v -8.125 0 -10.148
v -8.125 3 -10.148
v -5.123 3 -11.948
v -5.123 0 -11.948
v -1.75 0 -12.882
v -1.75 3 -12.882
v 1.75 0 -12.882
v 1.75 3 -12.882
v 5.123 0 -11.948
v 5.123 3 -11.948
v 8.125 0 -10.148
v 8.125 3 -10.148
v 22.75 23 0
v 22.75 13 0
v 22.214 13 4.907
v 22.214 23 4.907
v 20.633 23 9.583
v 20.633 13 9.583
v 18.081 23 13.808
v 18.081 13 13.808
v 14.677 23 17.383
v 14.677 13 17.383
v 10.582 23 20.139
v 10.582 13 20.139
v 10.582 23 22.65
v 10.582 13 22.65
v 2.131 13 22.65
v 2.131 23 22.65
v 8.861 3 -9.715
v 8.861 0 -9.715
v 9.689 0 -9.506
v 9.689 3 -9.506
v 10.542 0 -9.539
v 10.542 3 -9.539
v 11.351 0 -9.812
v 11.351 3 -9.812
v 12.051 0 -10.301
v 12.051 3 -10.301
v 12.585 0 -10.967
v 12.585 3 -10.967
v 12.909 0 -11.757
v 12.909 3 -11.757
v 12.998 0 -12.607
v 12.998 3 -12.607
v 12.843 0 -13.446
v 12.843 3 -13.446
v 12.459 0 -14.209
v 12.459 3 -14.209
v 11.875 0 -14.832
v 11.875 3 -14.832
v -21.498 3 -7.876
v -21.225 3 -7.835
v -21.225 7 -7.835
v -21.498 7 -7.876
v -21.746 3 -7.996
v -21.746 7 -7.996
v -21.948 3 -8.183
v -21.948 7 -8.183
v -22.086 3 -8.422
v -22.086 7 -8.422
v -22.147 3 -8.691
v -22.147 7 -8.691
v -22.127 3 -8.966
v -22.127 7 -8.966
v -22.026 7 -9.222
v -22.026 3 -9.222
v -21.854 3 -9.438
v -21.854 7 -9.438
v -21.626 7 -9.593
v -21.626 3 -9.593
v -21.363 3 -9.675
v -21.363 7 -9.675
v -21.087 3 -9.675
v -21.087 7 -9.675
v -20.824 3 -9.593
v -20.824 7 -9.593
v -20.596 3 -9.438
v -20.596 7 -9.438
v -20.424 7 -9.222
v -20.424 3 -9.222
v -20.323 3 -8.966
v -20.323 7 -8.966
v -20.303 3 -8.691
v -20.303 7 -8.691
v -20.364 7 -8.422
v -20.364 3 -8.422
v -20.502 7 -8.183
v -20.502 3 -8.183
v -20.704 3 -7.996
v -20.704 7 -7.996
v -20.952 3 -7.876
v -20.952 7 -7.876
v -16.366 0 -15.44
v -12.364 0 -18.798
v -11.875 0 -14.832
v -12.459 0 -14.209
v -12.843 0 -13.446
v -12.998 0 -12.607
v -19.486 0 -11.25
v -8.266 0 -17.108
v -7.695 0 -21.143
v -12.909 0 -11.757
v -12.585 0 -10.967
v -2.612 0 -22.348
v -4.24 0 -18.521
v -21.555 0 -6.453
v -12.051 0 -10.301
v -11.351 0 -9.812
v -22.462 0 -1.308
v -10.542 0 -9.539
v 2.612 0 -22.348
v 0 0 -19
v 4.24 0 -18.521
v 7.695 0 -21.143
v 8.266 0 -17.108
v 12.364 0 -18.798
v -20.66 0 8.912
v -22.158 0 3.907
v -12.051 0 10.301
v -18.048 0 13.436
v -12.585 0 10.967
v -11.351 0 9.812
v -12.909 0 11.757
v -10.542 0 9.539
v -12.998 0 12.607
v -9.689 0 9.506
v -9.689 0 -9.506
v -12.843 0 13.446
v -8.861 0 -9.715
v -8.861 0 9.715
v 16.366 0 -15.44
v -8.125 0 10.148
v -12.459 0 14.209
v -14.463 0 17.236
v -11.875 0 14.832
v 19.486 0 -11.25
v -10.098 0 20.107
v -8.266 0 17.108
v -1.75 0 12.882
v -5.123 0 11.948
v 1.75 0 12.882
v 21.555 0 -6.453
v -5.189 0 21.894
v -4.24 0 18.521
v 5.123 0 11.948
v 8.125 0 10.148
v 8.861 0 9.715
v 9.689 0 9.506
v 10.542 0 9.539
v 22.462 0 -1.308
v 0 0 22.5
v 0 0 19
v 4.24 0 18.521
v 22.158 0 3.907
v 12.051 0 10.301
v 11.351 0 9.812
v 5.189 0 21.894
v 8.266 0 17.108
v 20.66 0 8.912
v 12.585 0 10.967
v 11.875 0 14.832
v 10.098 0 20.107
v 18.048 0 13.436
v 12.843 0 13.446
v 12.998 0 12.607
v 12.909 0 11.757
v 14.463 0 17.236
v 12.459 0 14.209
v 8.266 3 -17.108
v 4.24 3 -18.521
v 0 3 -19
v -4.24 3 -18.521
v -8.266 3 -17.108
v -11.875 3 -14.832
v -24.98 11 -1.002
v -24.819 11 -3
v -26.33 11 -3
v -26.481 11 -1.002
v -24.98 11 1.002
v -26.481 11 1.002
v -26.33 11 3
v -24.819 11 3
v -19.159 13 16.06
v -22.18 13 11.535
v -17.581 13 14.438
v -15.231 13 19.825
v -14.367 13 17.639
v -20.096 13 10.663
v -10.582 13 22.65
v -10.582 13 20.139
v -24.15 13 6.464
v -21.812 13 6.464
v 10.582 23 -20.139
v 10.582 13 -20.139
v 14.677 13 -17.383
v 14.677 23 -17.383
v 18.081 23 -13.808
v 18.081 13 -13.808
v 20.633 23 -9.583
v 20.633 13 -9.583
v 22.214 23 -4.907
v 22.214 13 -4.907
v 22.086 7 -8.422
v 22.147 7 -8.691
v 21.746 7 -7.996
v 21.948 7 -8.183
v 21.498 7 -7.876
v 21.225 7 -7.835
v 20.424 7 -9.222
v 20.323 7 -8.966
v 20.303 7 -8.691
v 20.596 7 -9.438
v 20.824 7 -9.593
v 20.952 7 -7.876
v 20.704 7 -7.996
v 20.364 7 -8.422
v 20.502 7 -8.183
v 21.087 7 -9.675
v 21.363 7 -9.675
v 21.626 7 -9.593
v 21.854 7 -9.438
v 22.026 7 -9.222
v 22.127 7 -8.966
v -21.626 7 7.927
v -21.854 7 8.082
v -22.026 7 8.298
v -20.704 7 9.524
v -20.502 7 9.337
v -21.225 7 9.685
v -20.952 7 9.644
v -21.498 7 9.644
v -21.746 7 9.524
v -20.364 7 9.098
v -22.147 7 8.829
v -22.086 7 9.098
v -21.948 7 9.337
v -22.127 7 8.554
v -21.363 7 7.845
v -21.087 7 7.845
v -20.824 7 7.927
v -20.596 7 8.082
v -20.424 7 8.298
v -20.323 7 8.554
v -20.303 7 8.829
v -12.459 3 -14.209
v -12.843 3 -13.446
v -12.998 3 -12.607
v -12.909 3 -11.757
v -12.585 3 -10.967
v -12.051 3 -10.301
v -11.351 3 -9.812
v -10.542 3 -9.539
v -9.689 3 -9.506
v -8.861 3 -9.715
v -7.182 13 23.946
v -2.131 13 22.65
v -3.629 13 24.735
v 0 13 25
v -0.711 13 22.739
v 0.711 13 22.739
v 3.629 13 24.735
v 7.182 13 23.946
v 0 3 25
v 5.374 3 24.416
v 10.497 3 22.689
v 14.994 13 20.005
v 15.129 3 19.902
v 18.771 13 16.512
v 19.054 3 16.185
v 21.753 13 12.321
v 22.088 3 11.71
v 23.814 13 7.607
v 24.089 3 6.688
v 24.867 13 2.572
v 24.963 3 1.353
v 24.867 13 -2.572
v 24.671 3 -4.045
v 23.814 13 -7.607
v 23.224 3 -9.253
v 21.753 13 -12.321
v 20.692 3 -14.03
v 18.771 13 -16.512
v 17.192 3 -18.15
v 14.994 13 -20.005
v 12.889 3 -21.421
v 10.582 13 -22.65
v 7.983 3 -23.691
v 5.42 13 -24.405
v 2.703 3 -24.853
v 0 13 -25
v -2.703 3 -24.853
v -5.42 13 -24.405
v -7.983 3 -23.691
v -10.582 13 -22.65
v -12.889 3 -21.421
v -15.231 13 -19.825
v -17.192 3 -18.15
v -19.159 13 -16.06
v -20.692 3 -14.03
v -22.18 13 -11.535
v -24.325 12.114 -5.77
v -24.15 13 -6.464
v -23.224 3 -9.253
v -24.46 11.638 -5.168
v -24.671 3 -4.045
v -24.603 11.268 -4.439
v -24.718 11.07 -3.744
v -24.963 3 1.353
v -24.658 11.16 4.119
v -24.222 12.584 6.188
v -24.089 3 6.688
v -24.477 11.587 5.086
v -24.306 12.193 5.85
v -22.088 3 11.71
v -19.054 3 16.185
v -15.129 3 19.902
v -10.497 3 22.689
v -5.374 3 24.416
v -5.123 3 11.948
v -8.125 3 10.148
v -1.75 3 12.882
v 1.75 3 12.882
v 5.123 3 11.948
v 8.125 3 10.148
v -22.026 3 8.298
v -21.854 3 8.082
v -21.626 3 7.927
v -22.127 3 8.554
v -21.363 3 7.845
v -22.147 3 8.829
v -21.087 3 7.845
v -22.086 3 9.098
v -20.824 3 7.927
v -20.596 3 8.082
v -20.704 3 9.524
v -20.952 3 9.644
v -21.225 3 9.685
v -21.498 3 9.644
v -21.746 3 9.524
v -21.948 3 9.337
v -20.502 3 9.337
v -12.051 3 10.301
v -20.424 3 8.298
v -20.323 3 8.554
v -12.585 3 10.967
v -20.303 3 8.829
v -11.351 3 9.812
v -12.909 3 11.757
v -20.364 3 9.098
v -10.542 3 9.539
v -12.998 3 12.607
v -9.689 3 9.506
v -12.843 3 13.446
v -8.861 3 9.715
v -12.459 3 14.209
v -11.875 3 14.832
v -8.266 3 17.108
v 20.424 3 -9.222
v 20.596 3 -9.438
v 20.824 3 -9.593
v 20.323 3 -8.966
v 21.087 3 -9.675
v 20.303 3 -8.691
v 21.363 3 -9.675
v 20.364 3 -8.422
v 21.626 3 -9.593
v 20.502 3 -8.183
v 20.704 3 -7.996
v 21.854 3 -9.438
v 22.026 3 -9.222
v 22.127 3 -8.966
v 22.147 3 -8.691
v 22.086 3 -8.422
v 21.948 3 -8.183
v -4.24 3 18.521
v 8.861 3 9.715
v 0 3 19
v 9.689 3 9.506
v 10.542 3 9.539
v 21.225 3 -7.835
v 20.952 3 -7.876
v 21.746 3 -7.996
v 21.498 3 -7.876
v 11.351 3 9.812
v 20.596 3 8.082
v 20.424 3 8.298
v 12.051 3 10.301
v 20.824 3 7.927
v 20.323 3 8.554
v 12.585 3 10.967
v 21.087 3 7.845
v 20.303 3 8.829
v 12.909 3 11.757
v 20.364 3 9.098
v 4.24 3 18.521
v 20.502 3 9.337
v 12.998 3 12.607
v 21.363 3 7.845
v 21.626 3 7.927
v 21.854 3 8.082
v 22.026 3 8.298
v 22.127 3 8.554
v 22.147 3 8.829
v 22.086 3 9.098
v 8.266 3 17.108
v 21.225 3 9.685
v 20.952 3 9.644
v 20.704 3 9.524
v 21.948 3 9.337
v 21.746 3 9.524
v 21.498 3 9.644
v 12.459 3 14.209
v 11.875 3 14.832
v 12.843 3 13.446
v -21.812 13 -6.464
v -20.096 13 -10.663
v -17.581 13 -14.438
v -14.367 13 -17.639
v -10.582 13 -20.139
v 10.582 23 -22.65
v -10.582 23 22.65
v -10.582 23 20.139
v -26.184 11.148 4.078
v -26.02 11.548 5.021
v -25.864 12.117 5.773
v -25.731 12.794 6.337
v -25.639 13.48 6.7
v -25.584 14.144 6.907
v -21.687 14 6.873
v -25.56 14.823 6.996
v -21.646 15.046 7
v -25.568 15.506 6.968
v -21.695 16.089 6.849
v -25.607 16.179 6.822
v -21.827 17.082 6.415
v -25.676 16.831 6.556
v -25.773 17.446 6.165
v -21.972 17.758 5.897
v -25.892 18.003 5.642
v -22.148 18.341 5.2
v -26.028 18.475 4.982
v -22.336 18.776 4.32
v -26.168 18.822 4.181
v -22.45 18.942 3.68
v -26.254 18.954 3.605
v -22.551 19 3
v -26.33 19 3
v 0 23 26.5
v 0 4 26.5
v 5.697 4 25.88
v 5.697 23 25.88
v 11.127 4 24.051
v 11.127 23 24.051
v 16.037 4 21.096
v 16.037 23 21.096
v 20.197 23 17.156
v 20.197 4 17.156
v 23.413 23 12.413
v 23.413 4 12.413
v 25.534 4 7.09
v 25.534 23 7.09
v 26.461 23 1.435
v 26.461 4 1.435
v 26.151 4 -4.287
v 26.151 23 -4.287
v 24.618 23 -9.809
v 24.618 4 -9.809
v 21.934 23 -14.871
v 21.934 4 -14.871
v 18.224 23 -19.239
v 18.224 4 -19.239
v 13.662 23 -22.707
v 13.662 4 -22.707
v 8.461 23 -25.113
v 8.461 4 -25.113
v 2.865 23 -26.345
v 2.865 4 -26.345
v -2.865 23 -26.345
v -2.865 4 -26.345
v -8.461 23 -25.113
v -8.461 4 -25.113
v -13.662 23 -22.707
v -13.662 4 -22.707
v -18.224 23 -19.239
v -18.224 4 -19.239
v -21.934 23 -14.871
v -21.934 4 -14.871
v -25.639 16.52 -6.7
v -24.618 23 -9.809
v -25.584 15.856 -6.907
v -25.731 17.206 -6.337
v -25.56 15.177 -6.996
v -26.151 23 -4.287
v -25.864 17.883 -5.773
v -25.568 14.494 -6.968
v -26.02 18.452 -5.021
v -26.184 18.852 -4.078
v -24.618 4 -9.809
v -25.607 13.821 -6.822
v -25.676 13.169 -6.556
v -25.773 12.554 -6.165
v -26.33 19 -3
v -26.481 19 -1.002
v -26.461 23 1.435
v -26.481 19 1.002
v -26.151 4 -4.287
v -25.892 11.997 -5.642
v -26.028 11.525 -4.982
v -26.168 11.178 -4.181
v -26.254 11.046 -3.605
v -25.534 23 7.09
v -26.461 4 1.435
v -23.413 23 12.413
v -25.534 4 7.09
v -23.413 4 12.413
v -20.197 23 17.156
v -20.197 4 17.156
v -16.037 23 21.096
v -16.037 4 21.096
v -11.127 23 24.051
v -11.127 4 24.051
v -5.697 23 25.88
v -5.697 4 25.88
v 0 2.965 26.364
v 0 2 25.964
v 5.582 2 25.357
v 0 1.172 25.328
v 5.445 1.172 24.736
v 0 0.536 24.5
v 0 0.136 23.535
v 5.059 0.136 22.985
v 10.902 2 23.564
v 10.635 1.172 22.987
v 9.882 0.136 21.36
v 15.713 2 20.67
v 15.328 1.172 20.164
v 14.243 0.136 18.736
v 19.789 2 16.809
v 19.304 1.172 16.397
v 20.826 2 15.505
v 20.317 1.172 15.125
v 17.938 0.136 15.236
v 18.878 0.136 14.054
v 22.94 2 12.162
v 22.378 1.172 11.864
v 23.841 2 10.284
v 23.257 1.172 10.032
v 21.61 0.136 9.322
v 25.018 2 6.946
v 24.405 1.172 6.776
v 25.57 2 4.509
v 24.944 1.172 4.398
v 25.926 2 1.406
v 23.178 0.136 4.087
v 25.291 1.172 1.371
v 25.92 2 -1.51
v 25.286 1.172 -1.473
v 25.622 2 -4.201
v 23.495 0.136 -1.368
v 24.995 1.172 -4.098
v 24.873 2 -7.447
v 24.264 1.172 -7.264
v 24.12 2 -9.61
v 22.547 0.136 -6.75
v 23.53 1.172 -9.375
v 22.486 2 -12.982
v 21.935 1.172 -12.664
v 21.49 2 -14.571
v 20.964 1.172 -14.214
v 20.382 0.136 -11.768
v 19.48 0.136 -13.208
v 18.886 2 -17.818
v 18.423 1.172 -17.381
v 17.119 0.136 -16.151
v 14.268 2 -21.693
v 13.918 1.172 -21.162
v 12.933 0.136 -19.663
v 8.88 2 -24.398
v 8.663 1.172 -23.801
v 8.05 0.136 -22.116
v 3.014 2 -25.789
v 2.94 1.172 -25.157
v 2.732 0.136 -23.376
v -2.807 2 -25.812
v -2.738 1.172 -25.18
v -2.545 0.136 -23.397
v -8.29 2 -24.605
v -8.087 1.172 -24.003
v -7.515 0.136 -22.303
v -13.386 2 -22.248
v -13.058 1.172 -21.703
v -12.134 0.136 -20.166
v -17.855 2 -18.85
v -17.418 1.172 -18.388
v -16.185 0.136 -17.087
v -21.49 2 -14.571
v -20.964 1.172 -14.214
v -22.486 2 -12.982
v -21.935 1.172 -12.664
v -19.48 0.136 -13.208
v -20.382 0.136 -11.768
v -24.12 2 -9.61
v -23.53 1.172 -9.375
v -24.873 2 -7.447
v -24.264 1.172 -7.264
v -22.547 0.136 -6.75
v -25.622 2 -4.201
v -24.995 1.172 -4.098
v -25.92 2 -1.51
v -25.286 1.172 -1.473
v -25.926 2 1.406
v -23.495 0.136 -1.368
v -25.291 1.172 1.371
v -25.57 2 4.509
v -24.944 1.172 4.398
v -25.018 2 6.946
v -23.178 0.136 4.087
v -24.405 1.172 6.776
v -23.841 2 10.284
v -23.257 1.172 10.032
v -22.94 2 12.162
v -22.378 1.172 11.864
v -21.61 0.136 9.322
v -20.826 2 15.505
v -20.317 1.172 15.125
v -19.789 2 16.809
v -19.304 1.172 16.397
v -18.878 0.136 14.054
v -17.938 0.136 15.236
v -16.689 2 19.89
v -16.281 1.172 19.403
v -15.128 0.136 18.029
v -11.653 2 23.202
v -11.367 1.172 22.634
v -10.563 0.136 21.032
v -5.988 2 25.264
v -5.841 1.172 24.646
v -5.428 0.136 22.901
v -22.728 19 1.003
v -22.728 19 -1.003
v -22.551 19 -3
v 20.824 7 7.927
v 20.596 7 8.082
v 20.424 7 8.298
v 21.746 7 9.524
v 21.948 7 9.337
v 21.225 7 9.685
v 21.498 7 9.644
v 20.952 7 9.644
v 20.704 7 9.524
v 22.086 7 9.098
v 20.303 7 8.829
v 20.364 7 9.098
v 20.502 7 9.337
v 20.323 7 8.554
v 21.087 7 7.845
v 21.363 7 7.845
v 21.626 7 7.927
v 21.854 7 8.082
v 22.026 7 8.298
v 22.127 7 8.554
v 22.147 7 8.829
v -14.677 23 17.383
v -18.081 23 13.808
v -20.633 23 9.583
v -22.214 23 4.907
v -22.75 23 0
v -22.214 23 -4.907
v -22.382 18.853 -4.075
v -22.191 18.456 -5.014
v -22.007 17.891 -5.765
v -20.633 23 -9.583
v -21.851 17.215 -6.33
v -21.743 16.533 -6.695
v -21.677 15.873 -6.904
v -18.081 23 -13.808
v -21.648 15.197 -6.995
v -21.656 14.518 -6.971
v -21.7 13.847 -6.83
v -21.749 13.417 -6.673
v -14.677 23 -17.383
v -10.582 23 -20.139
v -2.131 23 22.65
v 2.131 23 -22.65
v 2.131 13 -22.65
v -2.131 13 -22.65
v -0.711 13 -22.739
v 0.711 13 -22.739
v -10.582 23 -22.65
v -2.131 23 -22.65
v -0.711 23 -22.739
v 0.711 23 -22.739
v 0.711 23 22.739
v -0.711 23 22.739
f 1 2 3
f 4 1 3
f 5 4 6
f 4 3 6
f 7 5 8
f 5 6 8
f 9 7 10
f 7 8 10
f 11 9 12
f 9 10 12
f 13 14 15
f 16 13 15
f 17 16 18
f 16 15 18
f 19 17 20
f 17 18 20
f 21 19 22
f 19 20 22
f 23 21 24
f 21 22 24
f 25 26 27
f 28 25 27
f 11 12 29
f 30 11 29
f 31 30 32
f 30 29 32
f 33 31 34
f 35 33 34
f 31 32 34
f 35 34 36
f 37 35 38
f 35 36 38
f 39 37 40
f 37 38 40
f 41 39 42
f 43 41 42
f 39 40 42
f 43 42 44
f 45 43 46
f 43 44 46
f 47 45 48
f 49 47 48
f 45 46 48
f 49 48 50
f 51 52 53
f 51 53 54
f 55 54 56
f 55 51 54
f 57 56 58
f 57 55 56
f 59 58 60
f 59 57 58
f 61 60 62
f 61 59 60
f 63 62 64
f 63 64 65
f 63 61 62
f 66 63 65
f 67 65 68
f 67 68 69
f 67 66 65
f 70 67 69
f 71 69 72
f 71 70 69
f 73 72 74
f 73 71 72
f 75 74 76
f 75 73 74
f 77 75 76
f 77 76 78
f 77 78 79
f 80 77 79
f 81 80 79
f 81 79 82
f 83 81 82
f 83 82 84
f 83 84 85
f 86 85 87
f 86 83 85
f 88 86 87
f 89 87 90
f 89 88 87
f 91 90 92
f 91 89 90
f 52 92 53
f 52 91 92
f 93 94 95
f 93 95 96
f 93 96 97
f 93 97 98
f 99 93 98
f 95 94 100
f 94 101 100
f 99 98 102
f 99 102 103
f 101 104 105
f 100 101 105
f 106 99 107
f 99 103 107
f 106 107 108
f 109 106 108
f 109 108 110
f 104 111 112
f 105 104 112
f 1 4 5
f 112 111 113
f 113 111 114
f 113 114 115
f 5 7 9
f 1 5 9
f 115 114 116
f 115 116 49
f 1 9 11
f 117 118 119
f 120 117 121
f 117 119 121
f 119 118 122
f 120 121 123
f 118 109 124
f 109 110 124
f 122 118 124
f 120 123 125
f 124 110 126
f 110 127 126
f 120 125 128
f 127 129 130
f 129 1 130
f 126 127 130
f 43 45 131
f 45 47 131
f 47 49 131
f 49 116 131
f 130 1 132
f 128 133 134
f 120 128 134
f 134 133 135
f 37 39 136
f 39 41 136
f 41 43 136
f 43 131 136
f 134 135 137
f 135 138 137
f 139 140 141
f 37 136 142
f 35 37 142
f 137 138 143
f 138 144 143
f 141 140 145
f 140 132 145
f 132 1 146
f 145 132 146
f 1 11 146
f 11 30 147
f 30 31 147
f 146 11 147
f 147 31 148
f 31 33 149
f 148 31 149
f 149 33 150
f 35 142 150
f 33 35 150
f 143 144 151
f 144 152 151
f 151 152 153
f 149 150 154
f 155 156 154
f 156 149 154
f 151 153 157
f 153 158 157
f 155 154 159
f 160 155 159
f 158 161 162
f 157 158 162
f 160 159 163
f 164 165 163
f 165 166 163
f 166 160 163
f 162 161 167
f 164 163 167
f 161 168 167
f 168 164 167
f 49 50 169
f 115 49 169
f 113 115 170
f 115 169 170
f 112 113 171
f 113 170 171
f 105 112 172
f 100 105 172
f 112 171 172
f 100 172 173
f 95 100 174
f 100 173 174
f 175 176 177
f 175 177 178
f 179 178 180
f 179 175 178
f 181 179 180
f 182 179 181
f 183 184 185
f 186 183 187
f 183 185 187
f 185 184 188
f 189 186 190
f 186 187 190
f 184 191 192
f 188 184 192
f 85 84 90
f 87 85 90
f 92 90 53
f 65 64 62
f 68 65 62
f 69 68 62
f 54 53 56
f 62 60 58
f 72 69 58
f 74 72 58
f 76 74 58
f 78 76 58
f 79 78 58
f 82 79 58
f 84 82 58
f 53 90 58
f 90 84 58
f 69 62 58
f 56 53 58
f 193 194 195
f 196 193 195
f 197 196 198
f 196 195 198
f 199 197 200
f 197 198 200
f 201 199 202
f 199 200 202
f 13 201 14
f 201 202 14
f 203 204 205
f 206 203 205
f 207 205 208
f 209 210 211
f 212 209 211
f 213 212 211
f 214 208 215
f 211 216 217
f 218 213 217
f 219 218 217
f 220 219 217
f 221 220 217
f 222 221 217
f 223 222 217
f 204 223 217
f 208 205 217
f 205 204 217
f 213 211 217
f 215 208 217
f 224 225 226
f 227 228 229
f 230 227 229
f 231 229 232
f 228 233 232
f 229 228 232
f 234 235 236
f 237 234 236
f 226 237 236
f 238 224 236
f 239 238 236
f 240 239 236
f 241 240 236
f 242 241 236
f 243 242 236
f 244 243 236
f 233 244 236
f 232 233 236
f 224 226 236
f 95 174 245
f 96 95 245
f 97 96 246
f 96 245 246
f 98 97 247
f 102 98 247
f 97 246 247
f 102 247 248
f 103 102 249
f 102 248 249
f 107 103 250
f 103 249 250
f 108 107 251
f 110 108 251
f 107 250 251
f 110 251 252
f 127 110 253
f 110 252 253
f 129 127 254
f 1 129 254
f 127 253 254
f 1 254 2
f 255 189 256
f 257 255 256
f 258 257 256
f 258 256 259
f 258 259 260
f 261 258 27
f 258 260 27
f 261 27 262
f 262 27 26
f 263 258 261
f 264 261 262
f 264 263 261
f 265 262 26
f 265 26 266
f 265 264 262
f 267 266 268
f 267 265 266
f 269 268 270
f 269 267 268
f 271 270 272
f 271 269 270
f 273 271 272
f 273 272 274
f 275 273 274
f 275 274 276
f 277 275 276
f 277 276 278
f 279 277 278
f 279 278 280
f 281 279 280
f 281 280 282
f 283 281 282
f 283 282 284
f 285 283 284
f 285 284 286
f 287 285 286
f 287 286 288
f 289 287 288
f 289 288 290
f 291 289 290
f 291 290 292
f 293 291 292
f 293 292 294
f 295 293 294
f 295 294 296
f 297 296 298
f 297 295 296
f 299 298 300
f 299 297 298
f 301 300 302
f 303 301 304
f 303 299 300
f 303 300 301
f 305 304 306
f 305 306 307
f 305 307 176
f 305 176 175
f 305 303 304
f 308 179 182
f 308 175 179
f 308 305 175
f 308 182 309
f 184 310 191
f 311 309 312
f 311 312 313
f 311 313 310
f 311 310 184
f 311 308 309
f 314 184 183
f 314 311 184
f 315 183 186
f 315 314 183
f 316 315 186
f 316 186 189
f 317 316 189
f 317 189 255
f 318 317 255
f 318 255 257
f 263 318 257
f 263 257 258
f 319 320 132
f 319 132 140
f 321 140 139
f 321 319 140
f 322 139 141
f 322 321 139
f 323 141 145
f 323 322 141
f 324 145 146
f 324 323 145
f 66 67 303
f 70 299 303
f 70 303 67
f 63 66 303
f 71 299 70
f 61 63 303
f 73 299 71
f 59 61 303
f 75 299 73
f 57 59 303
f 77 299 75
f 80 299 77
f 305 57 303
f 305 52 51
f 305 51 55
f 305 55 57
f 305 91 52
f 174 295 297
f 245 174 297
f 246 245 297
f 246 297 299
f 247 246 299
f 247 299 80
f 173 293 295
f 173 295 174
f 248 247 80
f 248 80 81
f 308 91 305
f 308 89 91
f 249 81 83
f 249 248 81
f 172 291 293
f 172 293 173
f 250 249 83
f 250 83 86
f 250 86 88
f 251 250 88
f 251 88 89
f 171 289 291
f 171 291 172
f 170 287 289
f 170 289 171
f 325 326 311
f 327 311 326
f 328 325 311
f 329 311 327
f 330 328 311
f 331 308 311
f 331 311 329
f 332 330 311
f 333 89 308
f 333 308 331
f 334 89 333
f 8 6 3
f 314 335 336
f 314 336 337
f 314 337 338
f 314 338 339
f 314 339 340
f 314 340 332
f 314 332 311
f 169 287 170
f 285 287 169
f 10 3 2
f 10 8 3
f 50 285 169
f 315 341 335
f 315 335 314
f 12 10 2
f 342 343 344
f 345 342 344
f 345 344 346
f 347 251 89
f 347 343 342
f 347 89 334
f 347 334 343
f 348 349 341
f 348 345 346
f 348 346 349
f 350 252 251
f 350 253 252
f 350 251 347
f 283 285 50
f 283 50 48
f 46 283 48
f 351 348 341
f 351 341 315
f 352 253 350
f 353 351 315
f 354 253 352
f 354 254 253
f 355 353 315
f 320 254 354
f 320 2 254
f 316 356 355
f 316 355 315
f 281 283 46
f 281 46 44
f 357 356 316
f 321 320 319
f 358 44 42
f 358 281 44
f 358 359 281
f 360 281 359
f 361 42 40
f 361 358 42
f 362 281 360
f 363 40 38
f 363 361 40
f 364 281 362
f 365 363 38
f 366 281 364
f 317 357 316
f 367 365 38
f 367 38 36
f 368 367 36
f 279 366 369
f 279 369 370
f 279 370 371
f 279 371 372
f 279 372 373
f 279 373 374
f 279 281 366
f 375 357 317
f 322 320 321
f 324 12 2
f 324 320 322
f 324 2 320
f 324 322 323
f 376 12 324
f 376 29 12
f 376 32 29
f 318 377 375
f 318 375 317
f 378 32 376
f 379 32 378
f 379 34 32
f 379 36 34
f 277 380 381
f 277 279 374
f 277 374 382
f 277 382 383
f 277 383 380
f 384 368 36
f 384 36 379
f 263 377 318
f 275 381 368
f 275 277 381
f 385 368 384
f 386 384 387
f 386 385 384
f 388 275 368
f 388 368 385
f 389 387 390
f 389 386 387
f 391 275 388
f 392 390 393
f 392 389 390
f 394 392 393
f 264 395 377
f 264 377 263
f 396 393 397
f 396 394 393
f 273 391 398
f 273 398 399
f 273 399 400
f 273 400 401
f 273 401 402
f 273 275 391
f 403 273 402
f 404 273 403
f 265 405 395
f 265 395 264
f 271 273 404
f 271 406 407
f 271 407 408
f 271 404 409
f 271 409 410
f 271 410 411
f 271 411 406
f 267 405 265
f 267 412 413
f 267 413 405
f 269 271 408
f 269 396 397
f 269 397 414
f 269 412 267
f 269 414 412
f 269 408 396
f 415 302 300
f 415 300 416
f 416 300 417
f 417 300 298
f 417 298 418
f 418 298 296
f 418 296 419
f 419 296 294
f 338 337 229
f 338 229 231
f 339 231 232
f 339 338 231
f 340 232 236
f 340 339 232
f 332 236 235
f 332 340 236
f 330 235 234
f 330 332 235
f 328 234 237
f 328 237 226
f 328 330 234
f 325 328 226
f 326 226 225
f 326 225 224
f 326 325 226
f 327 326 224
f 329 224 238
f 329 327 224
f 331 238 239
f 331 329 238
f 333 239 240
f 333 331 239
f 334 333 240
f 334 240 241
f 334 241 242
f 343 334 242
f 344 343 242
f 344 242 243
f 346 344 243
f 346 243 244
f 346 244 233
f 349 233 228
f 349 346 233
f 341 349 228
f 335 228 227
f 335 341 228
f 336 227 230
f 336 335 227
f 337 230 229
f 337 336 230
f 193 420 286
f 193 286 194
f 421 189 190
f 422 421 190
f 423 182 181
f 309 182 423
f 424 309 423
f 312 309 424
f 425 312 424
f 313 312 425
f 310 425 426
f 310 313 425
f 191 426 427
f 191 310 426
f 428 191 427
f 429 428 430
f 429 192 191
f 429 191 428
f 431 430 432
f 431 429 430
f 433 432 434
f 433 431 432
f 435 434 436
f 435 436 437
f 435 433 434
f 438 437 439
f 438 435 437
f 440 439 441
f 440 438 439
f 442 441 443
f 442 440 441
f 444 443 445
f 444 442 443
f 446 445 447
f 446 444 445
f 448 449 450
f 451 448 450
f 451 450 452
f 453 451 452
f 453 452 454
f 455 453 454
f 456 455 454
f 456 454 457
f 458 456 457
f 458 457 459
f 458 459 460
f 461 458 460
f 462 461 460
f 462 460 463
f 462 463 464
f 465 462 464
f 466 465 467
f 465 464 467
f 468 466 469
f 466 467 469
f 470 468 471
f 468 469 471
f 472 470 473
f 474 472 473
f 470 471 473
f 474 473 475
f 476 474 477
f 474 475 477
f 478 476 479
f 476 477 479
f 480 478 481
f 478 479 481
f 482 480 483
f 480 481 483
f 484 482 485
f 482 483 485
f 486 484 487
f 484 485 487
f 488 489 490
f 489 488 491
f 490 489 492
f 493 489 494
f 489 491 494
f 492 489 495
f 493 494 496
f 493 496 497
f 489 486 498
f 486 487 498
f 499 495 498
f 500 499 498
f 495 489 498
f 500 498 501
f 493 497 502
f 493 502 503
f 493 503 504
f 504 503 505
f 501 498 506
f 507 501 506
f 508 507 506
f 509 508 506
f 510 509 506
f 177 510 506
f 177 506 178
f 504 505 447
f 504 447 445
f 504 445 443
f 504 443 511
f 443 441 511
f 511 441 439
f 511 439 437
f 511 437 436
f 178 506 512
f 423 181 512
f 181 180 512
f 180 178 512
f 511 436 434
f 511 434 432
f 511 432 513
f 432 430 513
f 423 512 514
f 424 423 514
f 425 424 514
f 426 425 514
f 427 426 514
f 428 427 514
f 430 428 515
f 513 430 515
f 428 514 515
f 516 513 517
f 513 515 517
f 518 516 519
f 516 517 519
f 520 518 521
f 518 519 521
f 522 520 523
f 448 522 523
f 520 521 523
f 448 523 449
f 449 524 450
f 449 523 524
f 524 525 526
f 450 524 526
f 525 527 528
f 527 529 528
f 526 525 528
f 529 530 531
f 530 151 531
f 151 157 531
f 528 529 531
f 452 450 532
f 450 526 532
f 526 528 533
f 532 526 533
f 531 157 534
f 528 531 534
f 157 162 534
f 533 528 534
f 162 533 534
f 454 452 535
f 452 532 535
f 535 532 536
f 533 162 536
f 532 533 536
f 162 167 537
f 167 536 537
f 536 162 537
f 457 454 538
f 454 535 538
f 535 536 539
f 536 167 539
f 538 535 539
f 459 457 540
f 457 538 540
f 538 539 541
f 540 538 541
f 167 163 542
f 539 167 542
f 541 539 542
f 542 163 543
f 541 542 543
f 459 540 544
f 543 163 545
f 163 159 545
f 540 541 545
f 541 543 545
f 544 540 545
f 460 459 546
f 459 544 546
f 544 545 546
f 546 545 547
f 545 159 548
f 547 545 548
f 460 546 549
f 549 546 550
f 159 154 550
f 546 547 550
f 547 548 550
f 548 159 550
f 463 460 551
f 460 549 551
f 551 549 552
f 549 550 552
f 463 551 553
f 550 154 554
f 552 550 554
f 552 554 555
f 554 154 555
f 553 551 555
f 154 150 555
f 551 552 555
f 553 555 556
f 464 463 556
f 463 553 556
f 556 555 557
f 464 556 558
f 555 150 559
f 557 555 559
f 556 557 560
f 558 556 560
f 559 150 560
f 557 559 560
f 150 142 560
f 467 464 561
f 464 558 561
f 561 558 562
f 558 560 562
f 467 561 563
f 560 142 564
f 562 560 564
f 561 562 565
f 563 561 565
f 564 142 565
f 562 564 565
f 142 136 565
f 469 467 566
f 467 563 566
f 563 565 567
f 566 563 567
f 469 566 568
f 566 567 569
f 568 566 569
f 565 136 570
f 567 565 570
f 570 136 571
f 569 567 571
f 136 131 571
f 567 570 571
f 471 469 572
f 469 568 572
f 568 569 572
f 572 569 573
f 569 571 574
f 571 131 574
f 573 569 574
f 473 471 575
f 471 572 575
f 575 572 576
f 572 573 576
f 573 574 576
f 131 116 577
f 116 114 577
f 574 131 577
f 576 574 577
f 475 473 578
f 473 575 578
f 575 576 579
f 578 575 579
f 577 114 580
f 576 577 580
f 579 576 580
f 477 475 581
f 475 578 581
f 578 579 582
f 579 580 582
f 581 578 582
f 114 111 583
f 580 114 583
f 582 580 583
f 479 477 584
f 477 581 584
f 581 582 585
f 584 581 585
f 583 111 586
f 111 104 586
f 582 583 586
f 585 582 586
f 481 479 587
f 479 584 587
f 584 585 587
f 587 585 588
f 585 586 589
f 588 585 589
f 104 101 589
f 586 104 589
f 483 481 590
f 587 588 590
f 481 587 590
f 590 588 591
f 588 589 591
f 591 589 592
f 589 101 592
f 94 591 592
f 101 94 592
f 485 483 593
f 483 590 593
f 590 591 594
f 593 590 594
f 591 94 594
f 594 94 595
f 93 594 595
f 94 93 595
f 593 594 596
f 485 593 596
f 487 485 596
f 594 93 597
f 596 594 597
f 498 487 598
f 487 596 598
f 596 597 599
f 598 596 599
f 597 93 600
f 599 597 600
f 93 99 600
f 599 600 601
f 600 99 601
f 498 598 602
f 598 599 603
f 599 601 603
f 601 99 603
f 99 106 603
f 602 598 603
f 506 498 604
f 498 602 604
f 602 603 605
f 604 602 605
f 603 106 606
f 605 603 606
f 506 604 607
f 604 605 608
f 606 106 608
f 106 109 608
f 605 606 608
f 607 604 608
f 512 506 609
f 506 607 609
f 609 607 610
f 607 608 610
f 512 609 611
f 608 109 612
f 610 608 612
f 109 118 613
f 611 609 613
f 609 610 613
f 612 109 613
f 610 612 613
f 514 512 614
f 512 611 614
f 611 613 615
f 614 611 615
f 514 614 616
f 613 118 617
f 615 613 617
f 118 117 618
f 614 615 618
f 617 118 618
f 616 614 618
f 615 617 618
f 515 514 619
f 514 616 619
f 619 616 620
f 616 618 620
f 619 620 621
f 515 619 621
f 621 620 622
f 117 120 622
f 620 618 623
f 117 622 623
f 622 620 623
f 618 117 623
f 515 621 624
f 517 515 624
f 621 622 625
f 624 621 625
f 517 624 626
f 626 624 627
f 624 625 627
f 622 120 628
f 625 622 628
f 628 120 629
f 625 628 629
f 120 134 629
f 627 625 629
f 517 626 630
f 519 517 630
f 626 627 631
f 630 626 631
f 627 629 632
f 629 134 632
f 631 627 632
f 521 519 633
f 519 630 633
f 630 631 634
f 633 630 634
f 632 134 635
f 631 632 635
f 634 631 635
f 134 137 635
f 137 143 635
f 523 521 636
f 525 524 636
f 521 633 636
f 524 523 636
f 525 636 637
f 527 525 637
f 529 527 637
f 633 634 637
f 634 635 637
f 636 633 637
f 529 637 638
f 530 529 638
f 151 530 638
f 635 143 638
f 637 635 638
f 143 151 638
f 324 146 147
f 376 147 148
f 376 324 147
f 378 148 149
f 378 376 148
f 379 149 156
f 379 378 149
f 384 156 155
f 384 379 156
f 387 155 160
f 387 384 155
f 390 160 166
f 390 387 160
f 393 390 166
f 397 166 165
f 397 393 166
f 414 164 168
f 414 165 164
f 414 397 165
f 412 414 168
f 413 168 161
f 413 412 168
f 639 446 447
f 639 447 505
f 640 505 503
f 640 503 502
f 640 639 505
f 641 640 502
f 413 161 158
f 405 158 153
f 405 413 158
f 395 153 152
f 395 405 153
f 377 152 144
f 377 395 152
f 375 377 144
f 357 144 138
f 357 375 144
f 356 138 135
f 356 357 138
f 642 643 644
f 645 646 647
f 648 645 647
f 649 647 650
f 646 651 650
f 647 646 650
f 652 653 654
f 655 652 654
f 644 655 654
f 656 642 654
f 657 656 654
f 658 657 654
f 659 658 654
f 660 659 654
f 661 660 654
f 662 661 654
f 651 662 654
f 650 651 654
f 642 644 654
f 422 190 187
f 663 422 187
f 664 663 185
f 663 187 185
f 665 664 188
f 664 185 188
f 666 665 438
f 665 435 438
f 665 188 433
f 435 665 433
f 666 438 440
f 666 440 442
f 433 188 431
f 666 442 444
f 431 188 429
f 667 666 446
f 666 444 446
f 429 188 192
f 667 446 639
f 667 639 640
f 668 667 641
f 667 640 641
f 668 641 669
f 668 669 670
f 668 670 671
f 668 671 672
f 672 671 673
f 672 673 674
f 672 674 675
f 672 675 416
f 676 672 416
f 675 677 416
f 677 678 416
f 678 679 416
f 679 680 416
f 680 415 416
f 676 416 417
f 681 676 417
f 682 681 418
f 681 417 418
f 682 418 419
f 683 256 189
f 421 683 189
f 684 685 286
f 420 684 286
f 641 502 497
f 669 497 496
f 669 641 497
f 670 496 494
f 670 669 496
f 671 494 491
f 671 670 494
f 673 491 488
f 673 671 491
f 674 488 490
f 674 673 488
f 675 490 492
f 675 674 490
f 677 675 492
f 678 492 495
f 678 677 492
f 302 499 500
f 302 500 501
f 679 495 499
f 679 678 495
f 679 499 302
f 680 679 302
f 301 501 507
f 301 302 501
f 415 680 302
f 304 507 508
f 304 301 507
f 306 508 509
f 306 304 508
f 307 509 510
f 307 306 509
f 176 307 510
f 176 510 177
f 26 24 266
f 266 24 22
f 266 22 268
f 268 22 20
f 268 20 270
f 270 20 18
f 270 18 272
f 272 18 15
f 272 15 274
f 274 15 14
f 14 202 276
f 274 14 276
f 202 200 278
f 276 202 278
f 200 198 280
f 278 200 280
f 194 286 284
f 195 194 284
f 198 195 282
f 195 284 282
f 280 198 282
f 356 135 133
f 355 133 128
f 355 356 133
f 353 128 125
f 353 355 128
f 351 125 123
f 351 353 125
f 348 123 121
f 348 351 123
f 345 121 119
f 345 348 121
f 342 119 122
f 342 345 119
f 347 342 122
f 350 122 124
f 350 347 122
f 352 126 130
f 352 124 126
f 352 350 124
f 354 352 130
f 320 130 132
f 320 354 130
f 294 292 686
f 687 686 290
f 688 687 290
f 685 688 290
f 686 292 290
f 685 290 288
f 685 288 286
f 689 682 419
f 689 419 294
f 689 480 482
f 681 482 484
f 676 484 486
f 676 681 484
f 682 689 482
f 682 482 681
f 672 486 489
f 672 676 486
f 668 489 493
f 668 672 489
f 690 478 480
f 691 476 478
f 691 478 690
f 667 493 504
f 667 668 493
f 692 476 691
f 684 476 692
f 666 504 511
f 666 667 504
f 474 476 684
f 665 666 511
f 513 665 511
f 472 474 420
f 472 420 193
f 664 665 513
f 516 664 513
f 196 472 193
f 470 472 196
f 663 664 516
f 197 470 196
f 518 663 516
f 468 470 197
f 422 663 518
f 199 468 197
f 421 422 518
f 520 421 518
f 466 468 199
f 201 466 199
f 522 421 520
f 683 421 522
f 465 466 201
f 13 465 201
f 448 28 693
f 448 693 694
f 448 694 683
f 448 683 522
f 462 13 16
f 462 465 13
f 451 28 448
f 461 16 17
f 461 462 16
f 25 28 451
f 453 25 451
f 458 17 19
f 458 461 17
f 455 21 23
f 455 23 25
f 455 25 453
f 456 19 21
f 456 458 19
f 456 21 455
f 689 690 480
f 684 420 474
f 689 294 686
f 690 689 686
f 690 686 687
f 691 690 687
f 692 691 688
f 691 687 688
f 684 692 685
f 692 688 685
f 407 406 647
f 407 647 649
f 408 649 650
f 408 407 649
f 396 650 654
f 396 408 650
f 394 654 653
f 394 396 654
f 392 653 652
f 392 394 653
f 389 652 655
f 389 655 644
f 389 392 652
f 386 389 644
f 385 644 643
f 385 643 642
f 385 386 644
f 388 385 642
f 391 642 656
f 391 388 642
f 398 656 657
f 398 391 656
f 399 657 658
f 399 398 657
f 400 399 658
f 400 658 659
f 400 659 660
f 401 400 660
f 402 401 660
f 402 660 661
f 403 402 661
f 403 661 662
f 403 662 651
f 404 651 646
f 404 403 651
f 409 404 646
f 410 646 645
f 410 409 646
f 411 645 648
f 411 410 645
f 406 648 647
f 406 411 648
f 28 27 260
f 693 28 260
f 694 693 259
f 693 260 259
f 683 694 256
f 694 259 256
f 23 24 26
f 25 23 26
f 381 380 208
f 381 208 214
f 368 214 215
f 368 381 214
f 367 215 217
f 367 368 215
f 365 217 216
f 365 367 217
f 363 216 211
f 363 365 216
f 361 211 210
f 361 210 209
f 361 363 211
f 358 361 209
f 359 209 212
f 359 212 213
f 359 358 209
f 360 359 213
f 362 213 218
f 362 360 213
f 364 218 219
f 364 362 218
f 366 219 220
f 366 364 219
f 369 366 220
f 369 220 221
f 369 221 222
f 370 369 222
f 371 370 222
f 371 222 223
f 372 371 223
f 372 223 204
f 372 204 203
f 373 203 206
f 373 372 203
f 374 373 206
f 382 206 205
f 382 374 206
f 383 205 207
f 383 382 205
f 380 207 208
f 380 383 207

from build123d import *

# Parameters (mm, degrees)
SKETCH1_R           = 26.5
BOSS_EXTRUDE1_DEPTH = 3
BOSS_EXTRUDE2_START = 3
SKETCH1_3_R         = 26.5
SKETCH1_3_R_2       = 25
BOSS_EXTRUDE2_DEPTH = 10
CUT_EXTRUDE1_DEPTH  = 39.787884706
SKETCH3_R           = 26.5
SKETCH3_R_2         = 25
BOSS_EXTRUDE3_DEPTH = 10
SKETCH5_R           = 0.925
BOSS_EXTRUDE5_DEPTH = 4
FILLET1_R           = 4
CUT_EXTRUDE2_DEPTH  = 44


with BuildPart() as part:
    # Sketch1 → Boss-Extrude1 (new body)
    with BuildSketch(Plane(origin=(0, 0, 0), x_dir=(1, 0, 0), z_dir=(0, 1, 0))):
        with Locations(Location((0, 0, 0), (0, 0, 270))):
            Circle(SKETCH1_R)
    extrude(amount=BOSS_EXTRUDE1_DEPTH)

    # Sketch1<3> → Boss-Extrude2 (add)
    with BuildSketch(Plane(origin=(0, 0, 0), x_dir=(1, 0, 0), z_dir=(0, 1, 0)).offset(BOSS_EXTRUDE2_START)):
        with Locations(Location((0, 0, 0), (0, 0, 270))):
            Circle(SKETCH1_3_R)
        with Locations(Location((0, 0, 0), (0, 0, 270))):
            Circle(SKETCH1_3_R_2, mode=Mode.SUBTRACT)
    extrude(amount=BOSS_EXTRUDE2_DEPTH)

    # Sketch2 → Cut-Extrude1 (cut, through all)
    with BuildSketch(Plane(origin=(0, 3, 0), x_dir=(1, 0, 0), z_dir=(0, 1, 0))):
        with BuildLine():
            ThreePointArc((11.875, 14.831870246), (0, 19), (-11.875, 14.831870246))
            ThreePointArc((-11.875, 14.831870246), (-12.341874249, 10.614995997), (-8.125, 10.148121747))
            ThreePointArc((-8.125, 10.148121747), (0, 13), (8.125, 10.148121747))
            ThreePointArc((8.125, 10.148121747), (12.341874249, 10.614995997), (11.875, 14.831870246))
        make_face()
        with BuildLine():
            ThreePointArc((11.875, -14.831870246), (0, -19), (-11.875, -14.831870246))
            ThreePointArc((-11.875, -14.831870246), (-12.341874249, -10.614995997), (-8.125, -10.148121747))
            ThreePointArc((-8.125, -10.148121747), (0, -13), (8.125, -10.148121747))
            ThreePointArc((8.125, -10.148121747), (12.341874249, -10.614995997), (11.875, -14.831870246))
        make_face()
    extrude(amount=-CUT_EXTRUDE1_DEPTH, mode=Mode.SUBTRACT)

    # Sketch3 → Boss-Extrude3 (add)
    # profile 1 of 5: a face of its own
    with BuildSketch(Plane(origin=(0, 13, 0), x_dir=(1, 0, 0), z_dir=(0, 1, 0))):
        with Locations(Location((0, 0, 0), (0, 0, 270))):
            Circle(SKETCH3_R)
        with Locations(Location((0, 0, 0), (0, 0, 115.041695193))):
            Circle(SKETCH3_R_2, mode=Mode.SUBTRACT)
    # profile 2 of 5: a face of its own
    with BuildSketch(Plane(origin=(0, 13, 0), x_dir=(1, 0, 0), z_dir=(0, 1, 0))):
        with BuildLine():
            ThreePointArc((-10.581942166, 22.65), (-25, 0), (-10.581942166, -22.65))
            Line((-10.581942166, -22.65), (-10.581942166, -20.139140995))
            ThreePointArc((-10.581942166, -20.139140995), (-22.75, 0), (-10.581942166, 20.139140995))
            Line((-10.581942166, 20.139140995), (-10.581942166, 22.65))
        make_face()
    # profile 3 of 5: a face of its own
    with BuildSketch(Plane(origin=(0, 13, 0), x_dir=(1, 0, 0), z_dir=(0, 1, 0))):
        with BuildLine():
            ThreePointArc((10.581942166, 22.65), (0, 25), (-10.581942166, 22.65))
            Line((-10.581942166, 22.65), (-2.130727575, 22.65))
            ThreePointArc((-2.130727575, 22.65), (0, 22.75), (2.130727575, 22.65))
            Line((2.130727575, 22.65), (10.581942166, 22.65))
        make_face()
    # profile 4 of 5: a face of its own
    with BuildSketch(Plane(origin=(0, 13, 0), x_dir=(1, 0, 0), z_dir=(0, 1, 0))):
        with BuildLine():
            Line((10.581942166, -20.139140995), (10.581942166, -22.65))
            ThreePointArc((10.581942166, -22.65), (21.089672285, -13.424817426), (25, 0))
            ThreePointArc((25, 0), (21.089672285, 13.424817426), (10.581942166, 22.65))
            Line((10.581942166, 22.65), (10.581942166, 20.139140995))
            ThreePointArc((10.581942166, 20.139140995), (19.471796069, 11.7648484), (22.75, 0))
            ThreePointArc((22.75, 0), (19.471796069, -11.7648484), (10.581942166, -20.139140995))
        make_face()
    # profile 5 of 5: a face of its own
    with BuildSketch(Plane(origin=(0, 13, 0), x_dir=(1, 0, 0), z_dir=(0, 1, 0))):
        with BuildLine():
            Line((-2.130727575, -22.65), (-10.581942166, -22.65))
            ThreePointArc((-10.581942166, -22.65), (0, -25), (10.581942166, -22.65))
            Line((10.581942166, -22.65), (2.130727575, -22.65))
            ThreePointArc((2.130727575, -22.65), (0, -22.75), (-2.130727575, -22.65))
        make_face()
    extrude(amount=BOSS_EXTRUDE3_DEPTH)

    # Sketch5 → Boss-Extrude5 (add)
    with BuildSketch(Plane(origin=(0, 3, -3), x_dir=(1, 0, 0), z_dir=(0, -1, 0))):
        with Locations(Location((-21.225, 11.76, 0), (0, 0, 90))):
            Circle(SKETCH5_R)
        with Locations(Location((21.225, 11.76, 0), (0, 0, 90))):
            Circle(SKETCH5_R)
        with Locations(Location((-21.225, -5.76, 0), (0, 0, 90))):
            Circle(SKETCH5_R)
        with Locations(Location((21.225, -5.76, 0), (0, 0, 90))):
            Circle(SKETCH5_R)
    extrude(amount=-BOSS_EXTRUDE5_DEPTH)

    # Fillet1
    fillet1_edges = [part.edges().sort_by_distance(p)[0] for p in [
        (0, 0, -26.5),
    ]]
    fillet(fillet1_edges, radius=FILLET1_R)

    # Sketch6 → Cut-Extrude2 (cut)
    with BuildSketch(Plane(origin=(0, 0, 0), x_dir=(0, 0, -1), z_dir=(1, 0, 0))):
        with BuildLine():
            Line((-3, 19), (3, 19))
            ThreePointArc((3, 19), (7, 15), (3, 11))
            Line((3, 11), (-3, 11))
            ThreePointArc((-3, 11), (-7, 15), (-3, 19))
        make_face()
    extrude(amount=-CUT_EXTRUDE2_DEPTH, mode=Mode.SUBTRACT)


solid = part.part
